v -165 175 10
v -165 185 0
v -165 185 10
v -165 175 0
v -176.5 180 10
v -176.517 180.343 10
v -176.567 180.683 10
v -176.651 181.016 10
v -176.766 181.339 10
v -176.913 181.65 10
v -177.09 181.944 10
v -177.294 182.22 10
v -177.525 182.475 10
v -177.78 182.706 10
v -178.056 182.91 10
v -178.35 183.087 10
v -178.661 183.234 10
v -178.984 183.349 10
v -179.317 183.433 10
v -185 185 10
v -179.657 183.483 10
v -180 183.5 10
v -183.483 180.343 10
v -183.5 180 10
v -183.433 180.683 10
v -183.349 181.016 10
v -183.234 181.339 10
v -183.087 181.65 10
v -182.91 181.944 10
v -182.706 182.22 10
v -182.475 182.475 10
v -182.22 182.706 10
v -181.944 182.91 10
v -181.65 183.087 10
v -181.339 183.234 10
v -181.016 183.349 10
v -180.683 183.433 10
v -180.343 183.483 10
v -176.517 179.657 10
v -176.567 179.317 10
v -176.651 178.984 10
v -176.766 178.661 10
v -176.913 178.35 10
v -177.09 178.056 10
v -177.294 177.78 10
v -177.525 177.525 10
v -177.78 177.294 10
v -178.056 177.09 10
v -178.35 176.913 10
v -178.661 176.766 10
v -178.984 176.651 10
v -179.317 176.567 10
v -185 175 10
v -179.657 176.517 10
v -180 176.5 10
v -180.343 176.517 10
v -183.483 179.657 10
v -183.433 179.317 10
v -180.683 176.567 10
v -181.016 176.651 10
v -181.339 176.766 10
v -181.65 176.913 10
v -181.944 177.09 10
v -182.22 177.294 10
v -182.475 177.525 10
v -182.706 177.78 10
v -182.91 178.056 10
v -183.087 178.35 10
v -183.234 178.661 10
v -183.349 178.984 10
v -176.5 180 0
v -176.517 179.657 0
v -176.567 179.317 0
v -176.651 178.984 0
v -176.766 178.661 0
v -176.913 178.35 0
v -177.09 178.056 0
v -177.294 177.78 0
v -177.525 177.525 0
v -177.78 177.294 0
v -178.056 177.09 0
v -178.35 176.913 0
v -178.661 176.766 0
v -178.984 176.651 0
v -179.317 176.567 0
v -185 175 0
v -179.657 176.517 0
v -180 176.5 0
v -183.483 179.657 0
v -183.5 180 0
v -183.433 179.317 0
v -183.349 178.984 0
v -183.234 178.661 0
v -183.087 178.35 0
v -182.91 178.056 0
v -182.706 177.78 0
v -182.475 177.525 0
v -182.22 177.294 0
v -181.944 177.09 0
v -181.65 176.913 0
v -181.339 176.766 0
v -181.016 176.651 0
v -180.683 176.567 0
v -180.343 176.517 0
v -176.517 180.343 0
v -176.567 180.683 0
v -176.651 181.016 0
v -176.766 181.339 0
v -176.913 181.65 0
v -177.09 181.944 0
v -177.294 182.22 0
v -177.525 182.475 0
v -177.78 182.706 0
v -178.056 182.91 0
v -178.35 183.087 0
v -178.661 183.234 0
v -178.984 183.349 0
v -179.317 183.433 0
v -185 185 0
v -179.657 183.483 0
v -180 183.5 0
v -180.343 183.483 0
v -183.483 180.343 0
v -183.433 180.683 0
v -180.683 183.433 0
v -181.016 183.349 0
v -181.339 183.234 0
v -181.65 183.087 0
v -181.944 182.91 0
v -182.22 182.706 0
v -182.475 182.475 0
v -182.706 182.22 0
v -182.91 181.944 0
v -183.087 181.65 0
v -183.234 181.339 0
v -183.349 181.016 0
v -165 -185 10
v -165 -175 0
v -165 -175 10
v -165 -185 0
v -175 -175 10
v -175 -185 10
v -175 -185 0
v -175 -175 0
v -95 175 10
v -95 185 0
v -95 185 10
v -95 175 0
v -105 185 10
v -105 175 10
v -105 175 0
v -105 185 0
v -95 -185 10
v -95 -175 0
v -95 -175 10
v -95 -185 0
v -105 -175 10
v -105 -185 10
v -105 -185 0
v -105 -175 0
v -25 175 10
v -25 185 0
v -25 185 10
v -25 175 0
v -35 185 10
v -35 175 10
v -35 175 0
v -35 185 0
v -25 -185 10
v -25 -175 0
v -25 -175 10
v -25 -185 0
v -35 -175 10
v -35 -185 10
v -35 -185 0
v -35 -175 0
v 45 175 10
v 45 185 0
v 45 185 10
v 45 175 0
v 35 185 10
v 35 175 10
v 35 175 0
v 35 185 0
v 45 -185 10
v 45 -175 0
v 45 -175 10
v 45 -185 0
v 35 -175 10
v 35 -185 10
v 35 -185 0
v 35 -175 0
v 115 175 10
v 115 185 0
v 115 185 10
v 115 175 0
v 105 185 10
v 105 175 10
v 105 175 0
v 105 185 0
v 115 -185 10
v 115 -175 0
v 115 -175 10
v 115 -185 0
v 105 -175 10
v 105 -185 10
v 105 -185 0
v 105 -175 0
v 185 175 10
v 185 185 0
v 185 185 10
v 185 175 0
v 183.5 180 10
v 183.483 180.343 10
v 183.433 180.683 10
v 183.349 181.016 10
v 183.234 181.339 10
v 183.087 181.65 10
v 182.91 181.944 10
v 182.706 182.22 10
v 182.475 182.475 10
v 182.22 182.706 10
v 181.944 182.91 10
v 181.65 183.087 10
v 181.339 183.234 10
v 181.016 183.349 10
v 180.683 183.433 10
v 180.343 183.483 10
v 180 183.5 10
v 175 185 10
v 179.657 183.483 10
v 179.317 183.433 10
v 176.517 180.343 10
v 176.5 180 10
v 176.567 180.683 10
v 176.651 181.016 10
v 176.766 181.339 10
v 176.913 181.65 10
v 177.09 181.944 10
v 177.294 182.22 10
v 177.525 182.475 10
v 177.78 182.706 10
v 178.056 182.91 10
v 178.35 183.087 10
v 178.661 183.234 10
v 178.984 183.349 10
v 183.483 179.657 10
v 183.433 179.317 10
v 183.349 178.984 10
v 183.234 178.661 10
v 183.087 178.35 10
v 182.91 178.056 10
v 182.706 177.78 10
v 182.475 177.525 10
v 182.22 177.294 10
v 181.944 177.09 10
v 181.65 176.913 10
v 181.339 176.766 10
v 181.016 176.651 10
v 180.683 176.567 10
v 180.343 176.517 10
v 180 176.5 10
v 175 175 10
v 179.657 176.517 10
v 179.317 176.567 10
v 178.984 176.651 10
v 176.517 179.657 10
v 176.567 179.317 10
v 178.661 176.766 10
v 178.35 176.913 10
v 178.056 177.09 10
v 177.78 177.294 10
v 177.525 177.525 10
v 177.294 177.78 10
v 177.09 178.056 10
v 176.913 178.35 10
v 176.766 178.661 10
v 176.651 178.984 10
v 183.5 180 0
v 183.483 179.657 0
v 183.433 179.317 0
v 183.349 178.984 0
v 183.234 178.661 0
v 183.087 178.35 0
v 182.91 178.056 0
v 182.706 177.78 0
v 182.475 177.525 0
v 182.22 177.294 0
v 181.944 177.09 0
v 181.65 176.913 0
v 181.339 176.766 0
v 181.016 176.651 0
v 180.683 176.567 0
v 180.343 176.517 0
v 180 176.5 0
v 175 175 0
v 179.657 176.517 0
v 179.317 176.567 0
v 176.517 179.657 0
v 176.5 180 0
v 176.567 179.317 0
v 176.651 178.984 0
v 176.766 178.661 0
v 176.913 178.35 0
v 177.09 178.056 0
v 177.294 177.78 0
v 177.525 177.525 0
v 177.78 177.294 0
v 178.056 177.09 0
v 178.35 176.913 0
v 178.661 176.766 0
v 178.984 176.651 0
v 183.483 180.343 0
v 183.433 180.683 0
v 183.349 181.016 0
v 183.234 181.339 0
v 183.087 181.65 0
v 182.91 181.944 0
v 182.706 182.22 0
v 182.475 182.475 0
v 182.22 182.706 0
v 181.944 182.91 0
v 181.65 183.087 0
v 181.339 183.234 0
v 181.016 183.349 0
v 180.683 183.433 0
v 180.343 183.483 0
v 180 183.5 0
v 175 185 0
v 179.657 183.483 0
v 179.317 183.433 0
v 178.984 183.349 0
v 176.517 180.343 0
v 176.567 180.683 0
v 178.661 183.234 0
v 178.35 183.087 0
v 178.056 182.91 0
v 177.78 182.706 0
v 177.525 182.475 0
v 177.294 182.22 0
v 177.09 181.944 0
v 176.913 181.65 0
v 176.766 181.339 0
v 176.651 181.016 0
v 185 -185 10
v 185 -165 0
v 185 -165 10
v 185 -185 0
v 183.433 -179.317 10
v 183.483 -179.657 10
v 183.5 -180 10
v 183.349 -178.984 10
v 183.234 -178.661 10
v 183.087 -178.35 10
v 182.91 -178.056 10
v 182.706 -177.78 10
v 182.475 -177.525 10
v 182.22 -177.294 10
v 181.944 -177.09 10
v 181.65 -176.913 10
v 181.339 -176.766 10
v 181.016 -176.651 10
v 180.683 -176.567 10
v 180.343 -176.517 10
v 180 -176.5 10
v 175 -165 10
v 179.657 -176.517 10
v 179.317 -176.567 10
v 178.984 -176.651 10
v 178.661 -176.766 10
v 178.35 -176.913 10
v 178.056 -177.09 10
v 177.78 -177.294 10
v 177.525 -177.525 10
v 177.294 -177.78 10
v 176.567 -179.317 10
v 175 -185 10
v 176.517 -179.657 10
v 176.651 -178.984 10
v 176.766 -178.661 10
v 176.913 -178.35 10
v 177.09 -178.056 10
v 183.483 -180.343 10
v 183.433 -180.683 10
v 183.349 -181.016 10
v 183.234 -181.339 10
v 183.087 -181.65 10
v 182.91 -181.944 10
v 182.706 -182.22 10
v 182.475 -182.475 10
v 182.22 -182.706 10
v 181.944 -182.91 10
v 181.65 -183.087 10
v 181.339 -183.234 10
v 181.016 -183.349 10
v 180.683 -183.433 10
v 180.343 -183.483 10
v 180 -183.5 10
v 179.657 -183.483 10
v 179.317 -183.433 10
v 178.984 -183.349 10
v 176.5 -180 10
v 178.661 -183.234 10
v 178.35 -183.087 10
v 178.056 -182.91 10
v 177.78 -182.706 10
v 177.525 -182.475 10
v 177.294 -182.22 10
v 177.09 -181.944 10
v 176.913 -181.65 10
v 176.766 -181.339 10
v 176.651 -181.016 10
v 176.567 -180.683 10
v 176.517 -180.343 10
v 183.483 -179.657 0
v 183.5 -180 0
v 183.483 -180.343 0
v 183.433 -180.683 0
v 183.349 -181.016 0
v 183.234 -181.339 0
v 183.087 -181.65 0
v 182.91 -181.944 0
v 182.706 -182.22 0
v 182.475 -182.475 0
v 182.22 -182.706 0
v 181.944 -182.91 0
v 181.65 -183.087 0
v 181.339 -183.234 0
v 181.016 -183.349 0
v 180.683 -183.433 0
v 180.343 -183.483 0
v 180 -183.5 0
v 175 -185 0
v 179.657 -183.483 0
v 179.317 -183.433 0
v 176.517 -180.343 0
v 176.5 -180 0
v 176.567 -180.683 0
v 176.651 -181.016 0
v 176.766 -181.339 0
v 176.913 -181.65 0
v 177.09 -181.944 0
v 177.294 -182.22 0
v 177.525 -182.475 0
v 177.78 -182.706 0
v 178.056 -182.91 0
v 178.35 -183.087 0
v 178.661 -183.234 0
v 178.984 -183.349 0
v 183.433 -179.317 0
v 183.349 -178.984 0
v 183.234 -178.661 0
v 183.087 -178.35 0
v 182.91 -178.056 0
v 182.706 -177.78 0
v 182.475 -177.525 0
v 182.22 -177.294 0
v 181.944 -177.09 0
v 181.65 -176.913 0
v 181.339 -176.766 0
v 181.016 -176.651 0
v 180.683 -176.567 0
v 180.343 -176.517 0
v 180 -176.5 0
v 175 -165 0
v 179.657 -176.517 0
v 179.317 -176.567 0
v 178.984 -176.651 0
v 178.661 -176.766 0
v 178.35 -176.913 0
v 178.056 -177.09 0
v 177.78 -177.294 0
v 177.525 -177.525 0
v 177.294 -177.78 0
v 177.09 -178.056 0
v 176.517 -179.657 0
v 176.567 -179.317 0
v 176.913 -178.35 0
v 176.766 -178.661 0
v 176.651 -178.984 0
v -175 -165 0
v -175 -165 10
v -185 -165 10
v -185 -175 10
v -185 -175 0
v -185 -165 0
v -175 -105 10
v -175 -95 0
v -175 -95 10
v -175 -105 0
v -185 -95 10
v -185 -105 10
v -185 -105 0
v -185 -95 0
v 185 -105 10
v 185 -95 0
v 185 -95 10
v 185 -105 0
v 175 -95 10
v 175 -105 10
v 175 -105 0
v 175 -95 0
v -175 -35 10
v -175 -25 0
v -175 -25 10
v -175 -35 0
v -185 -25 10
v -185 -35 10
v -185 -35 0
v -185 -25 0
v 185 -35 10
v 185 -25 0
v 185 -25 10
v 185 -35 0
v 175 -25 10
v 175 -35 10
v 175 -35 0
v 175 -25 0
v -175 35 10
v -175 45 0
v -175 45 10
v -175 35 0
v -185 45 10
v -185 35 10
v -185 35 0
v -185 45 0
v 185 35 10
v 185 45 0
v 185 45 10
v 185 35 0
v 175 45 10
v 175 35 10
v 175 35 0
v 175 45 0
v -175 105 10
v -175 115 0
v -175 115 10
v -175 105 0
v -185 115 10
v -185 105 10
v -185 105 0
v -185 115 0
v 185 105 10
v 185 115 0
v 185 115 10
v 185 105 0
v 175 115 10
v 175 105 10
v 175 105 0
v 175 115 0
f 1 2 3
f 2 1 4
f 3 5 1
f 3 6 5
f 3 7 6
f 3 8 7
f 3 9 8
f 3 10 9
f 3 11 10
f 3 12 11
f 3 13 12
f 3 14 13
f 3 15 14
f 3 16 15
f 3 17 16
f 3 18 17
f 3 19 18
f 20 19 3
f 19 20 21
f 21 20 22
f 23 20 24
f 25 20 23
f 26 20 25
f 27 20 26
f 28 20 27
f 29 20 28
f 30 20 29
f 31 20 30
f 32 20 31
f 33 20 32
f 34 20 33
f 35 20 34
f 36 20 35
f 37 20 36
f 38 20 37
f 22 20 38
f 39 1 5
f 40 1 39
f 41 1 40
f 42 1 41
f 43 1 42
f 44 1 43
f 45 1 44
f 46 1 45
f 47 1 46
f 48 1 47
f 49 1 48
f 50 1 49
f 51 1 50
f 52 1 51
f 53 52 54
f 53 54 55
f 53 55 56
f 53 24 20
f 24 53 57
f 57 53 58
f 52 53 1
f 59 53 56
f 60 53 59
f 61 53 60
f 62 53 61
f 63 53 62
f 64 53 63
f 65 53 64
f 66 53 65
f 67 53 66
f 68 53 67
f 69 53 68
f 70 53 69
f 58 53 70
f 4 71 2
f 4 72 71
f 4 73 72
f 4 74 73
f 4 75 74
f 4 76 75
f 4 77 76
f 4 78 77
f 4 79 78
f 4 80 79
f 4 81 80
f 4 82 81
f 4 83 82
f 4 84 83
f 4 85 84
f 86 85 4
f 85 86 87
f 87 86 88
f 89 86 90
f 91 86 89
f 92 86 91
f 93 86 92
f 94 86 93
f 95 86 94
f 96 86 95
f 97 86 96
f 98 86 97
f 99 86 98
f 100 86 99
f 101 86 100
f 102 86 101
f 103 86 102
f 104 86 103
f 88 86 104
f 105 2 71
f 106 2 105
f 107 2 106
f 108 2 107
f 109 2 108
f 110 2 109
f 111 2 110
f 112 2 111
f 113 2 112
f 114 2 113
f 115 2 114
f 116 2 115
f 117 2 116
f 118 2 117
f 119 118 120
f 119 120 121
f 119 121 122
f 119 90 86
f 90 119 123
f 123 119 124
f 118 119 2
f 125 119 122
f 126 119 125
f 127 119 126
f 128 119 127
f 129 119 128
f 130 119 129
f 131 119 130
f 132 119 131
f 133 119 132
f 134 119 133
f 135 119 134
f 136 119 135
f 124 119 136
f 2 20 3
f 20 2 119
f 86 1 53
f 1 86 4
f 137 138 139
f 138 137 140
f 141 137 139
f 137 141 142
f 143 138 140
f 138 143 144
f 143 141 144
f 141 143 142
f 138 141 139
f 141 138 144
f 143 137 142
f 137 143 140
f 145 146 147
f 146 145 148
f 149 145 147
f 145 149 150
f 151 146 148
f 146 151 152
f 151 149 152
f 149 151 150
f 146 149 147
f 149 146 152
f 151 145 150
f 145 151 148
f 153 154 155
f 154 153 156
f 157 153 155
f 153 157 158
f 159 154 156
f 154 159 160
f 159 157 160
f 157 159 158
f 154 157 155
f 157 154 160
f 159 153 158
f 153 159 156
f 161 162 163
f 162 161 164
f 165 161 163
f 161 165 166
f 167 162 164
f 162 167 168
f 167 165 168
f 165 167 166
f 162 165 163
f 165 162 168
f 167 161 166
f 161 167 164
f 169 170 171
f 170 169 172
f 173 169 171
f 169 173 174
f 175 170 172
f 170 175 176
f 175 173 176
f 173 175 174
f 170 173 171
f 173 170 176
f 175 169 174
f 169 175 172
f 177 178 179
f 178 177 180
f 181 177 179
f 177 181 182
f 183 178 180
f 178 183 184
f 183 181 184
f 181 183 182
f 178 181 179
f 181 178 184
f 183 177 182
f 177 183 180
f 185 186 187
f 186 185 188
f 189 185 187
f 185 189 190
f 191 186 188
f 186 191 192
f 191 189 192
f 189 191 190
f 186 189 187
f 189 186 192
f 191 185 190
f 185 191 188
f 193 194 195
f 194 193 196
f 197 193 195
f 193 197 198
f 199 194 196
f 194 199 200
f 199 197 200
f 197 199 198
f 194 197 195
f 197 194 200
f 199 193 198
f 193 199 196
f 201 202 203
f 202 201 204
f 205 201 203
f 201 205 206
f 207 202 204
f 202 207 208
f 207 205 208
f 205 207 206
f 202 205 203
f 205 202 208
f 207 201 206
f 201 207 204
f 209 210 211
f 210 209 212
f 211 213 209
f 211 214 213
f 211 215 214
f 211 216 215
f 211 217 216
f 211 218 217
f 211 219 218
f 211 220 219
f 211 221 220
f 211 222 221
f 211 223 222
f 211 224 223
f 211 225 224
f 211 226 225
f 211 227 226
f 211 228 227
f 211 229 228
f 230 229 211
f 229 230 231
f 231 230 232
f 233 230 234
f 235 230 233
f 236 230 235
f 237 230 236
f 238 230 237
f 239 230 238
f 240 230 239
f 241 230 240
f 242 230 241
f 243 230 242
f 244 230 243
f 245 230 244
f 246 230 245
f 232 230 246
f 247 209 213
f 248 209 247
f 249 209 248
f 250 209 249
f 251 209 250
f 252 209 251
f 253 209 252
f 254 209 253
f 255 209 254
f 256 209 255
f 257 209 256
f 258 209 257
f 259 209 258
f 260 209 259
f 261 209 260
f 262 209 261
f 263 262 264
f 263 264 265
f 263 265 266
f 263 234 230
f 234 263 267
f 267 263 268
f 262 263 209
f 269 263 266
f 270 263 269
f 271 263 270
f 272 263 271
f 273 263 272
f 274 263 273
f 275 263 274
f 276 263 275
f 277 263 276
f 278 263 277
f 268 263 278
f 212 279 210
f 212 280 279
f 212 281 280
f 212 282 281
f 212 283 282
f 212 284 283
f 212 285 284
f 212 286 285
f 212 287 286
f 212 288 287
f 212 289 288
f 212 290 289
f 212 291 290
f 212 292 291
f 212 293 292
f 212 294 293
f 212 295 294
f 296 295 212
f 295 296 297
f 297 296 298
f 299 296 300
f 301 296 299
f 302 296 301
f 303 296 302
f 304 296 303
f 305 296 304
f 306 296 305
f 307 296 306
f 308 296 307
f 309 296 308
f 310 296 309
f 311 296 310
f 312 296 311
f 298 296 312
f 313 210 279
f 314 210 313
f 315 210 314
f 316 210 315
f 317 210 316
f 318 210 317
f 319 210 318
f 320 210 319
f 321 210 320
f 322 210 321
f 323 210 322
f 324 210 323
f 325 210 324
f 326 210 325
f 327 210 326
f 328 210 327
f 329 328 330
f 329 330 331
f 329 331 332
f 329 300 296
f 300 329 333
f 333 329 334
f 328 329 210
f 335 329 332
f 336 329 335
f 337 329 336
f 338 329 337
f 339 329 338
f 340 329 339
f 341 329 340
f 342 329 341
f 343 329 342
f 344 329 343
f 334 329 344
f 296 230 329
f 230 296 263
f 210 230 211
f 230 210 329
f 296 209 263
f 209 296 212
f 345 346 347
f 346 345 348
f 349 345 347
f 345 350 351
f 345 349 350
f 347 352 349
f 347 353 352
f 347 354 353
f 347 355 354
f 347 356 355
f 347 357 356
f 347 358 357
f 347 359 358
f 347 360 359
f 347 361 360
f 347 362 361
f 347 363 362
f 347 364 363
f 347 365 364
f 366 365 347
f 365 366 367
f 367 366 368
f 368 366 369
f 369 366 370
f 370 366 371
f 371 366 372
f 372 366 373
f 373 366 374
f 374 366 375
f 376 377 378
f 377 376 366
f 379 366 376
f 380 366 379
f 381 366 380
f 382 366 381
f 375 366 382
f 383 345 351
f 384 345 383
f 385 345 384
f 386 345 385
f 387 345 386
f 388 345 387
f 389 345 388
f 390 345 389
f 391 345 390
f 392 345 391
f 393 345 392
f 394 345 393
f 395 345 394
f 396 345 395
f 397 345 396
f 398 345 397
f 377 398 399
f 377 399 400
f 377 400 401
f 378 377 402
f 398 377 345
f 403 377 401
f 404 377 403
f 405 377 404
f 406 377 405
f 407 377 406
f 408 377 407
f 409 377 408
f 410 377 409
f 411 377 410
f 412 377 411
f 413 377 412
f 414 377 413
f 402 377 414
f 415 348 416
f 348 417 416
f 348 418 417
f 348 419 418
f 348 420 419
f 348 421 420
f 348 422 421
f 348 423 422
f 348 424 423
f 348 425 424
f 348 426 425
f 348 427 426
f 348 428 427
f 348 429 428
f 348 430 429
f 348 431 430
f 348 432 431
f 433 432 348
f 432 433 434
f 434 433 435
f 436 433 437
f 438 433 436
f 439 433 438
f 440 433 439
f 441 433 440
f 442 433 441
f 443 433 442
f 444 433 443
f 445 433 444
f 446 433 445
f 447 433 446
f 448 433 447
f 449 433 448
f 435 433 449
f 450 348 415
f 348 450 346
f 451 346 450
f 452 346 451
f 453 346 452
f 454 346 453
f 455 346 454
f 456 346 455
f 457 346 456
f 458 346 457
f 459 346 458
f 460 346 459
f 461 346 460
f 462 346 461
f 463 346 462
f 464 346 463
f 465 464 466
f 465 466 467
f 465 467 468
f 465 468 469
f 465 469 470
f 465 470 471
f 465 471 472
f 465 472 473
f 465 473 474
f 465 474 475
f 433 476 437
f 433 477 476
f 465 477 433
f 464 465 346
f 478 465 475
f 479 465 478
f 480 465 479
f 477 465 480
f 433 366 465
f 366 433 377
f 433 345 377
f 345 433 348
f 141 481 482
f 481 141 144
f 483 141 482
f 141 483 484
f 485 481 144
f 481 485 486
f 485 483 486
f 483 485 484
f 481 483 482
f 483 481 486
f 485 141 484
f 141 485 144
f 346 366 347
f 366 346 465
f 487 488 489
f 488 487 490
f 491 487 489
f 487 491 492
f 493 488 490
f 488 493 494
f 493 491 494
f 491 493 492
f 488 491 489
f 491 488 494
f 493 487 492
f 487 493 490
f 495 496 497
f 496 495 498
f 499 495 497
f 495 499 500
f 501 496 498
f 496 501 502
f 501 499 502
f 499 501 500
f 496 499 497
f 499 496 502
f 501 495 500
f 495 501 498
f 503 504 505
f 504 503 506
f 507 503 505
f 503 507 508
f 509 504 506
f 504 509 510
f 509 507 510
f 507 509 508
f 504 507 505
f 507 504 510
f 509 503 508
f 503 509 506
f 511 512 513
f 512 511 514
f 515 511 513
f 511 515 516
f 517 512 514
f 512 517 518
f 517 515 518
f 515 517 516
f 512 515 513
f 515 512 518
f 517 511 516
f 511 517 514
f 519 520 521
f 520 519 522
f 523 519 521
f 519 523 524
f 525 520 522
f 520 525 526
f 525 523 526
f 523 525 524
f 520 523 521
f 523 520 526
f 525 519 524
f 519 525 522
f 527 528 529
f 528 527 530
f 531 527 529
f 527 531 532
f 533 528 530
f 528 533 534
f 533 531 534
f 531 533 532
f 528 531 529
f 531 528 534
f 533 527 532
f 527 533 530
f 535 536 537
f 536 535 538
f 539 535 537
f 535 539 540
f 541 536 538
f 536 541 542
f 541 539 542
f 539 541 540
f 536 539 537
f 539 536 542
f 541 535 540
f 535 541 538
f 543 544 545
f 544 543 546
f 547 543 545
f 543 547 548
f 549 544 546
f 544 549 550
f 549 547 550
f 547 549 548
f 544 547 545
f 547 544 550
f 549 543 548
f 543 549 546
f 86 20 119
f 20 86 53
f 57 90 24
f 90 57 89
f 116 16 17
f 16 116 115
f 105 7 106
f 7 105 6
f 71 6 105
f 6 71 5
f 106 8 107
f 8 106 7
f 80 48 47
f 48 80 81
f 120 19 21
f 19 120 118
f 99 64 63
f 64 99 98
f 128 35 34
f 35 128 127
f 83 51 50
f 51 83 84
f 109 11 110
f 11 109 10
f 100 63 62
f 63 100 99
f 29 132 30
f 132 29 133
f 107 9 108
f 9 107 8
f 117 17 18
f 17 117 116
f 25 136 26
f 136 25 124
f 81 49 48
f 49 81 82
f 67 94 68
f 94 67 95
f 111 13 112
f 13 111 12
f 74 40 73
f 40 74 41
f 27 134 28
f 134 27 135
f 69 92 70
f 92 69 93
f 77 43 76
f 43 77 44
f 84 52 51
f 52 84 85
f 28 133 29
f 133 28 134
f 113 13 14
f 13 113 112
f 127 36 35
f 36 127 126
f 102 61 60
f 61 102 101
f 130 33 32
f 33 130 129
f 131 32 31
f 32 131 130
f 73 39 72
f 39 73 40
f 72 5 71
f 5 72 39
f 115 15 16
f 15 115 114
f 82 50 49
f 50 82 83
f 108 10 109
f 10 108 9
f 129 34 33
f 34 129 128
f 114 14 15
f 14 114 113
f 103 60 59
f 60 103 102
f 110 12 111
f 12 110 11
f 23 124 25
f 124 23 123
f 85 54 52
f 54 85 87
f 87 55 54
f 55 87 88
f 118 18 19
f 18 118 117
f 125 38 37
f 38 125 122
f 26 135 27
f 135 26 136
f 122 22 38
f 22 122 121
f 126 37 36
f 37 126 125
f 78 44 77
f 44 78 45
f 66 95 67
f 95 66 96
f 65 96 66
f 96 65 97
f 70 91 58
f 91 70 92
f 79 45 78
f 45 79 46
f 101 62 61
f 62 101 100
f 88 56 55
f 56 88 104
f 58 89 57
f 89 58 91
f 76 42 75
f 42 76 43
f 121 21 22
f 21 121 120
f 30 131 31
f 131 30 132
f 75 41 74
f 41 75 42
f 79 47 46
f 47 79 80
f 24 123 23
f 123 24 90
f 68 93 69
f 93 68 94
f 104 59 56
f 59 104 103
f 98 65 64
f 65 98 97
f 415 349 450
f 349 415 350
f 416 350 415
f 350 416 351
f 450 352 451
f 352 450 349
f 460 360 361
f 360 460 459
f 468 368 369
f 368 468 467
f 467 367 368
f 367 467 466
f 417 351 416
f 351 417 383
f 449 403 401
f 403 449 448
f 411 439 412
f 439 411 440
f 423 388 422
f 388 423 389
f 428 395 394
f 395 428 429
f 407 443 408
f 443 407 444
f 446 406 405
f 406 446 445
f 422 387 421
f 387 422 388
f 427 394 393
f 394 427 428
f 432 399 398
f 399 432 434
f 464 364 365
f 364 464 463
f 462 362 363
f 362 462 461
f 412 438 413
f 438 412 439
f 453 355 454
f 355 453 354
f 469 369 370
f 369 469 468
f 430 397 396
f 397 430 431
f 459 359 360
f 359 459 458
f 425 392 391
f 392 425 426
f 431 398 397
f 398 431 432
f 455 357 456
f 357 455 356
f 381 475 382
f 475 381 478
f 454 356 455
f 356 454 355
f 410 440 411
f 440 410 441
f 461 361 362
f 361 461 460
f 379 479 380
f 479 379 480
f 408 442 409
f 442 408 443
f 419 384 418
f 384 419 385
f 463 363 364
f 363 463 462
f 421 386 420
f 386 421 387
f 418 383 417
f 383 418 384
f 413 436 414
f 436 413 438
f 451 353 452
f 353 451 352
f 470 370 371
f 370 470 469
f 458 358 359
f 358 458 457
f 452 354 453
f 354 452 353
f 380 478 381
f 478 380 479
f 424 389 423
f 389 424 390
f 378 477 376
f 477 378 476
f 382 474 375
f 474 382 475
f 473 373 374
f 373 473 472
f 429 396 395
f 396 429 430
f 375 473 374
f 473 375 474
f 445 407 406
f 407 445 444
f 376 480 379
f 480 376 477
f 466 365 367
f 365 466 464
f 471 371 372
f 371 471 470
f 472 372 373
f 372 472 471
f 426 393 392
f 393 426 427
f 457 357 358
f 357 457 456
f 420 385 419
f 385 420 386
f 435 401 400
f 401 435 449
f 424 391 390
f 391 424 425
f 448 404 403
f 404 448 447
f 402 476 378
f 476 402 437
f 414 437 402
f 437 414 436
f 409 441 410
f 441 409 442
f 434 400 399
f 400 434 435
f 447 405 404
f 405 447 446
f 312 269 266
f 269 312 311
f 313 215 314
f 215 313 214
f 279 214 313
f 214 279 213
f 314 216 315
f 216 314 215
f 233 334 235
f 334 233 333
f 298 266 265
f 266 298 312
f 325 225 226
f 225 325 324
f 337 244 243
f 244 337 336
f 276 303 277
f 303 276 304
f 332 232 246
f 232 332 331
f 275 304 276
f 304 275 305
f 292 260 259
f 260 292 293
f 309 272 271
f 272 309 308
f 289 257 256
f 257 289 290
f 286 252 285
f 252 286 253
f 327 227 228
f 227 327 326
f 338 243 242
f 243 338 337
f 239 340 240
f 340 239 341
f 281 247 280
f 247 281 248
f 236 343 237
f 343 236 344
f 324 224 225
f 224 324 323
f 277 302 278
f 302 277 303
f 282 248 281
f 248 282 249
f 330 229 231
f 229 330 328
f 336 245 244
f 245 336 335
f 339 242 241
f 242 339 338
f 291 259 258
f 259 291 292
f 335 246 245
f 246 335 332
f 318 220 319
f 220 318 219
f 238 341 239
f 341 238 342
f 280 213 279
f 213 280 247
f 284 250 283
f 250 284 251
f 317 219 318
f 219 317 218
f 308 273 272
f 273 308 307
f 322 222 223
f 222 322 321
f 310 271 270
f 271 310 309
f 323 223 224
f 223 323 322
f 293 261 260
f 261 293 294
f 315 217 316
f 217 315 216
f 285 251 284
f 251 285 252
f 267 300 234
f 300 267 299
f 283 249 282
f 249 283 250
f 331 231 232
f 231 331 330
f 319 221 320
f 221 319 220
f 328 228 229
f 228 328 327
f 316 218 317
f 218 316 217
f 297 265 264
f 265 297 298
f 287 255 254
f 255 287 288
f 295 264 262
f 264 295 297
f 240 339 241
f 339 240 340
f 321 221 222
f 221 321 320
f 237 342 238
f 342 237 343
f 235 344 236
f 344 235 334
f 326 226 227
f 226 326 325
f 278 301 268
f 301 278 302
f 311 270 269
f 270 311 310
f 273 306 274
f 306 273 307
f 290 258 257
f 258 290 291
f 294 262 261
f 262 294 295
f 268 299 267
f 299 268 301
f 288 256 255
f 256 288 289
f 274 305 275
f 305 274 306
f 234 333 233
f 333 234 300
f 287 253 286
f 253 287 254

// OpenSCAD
// ring_10.scad - ring index 10 (z bottom = 100 mm)
$fn = 64; bar = 10; half_b = bar/2; outer = 370; half_outer = outer/2;
front_y = 180; back_y = -180; left_x = -180; right_x = 180;
x_centers = [-170, -100, -30, 40, 110, 180];
z_centers = [5, 85, 155, 225, 295, 365, 435, 505, 575, 645, 715]; ring_z = 100;
module place_box(cx, cy, sx, sy) { translate([cx - sx/2, cy - sy/2, 0]) cube([sx, sy, bar]); }

difference() { union() {
    for (x = x_centers) { place_box(x, front_y, bar, bar); place_box(x, back_y, bar, bar); }
    for (y = x_centers) { place_box(left_x, y, bar, bar); place_box(right_x, y, bar, bar); }
    for (zc = z_centers) if ((zc - half_b < ring_z + bar) && (zc + half_b > ring_z)) {
        translate([-half_outer, front_y - half_b, 0]) cube([outer, bar, bar]);
        translate([-half_outer, back_y - half_b, 0])  cube([outer, bar, bar]);
        translate([left_x - half_b, -half_outer, 0])  cube([bar, outer, bar]);
        translate([right_x - half_b, -half_outer, 0]) cube([bar, outer, bar]);
    }
  }
  for (cx = [-180, 180]) for (cy = [-180, 180]) translate([cx, cy, 0]) cylinder(h = bar, r = 3.5, $fn = 64);
}
